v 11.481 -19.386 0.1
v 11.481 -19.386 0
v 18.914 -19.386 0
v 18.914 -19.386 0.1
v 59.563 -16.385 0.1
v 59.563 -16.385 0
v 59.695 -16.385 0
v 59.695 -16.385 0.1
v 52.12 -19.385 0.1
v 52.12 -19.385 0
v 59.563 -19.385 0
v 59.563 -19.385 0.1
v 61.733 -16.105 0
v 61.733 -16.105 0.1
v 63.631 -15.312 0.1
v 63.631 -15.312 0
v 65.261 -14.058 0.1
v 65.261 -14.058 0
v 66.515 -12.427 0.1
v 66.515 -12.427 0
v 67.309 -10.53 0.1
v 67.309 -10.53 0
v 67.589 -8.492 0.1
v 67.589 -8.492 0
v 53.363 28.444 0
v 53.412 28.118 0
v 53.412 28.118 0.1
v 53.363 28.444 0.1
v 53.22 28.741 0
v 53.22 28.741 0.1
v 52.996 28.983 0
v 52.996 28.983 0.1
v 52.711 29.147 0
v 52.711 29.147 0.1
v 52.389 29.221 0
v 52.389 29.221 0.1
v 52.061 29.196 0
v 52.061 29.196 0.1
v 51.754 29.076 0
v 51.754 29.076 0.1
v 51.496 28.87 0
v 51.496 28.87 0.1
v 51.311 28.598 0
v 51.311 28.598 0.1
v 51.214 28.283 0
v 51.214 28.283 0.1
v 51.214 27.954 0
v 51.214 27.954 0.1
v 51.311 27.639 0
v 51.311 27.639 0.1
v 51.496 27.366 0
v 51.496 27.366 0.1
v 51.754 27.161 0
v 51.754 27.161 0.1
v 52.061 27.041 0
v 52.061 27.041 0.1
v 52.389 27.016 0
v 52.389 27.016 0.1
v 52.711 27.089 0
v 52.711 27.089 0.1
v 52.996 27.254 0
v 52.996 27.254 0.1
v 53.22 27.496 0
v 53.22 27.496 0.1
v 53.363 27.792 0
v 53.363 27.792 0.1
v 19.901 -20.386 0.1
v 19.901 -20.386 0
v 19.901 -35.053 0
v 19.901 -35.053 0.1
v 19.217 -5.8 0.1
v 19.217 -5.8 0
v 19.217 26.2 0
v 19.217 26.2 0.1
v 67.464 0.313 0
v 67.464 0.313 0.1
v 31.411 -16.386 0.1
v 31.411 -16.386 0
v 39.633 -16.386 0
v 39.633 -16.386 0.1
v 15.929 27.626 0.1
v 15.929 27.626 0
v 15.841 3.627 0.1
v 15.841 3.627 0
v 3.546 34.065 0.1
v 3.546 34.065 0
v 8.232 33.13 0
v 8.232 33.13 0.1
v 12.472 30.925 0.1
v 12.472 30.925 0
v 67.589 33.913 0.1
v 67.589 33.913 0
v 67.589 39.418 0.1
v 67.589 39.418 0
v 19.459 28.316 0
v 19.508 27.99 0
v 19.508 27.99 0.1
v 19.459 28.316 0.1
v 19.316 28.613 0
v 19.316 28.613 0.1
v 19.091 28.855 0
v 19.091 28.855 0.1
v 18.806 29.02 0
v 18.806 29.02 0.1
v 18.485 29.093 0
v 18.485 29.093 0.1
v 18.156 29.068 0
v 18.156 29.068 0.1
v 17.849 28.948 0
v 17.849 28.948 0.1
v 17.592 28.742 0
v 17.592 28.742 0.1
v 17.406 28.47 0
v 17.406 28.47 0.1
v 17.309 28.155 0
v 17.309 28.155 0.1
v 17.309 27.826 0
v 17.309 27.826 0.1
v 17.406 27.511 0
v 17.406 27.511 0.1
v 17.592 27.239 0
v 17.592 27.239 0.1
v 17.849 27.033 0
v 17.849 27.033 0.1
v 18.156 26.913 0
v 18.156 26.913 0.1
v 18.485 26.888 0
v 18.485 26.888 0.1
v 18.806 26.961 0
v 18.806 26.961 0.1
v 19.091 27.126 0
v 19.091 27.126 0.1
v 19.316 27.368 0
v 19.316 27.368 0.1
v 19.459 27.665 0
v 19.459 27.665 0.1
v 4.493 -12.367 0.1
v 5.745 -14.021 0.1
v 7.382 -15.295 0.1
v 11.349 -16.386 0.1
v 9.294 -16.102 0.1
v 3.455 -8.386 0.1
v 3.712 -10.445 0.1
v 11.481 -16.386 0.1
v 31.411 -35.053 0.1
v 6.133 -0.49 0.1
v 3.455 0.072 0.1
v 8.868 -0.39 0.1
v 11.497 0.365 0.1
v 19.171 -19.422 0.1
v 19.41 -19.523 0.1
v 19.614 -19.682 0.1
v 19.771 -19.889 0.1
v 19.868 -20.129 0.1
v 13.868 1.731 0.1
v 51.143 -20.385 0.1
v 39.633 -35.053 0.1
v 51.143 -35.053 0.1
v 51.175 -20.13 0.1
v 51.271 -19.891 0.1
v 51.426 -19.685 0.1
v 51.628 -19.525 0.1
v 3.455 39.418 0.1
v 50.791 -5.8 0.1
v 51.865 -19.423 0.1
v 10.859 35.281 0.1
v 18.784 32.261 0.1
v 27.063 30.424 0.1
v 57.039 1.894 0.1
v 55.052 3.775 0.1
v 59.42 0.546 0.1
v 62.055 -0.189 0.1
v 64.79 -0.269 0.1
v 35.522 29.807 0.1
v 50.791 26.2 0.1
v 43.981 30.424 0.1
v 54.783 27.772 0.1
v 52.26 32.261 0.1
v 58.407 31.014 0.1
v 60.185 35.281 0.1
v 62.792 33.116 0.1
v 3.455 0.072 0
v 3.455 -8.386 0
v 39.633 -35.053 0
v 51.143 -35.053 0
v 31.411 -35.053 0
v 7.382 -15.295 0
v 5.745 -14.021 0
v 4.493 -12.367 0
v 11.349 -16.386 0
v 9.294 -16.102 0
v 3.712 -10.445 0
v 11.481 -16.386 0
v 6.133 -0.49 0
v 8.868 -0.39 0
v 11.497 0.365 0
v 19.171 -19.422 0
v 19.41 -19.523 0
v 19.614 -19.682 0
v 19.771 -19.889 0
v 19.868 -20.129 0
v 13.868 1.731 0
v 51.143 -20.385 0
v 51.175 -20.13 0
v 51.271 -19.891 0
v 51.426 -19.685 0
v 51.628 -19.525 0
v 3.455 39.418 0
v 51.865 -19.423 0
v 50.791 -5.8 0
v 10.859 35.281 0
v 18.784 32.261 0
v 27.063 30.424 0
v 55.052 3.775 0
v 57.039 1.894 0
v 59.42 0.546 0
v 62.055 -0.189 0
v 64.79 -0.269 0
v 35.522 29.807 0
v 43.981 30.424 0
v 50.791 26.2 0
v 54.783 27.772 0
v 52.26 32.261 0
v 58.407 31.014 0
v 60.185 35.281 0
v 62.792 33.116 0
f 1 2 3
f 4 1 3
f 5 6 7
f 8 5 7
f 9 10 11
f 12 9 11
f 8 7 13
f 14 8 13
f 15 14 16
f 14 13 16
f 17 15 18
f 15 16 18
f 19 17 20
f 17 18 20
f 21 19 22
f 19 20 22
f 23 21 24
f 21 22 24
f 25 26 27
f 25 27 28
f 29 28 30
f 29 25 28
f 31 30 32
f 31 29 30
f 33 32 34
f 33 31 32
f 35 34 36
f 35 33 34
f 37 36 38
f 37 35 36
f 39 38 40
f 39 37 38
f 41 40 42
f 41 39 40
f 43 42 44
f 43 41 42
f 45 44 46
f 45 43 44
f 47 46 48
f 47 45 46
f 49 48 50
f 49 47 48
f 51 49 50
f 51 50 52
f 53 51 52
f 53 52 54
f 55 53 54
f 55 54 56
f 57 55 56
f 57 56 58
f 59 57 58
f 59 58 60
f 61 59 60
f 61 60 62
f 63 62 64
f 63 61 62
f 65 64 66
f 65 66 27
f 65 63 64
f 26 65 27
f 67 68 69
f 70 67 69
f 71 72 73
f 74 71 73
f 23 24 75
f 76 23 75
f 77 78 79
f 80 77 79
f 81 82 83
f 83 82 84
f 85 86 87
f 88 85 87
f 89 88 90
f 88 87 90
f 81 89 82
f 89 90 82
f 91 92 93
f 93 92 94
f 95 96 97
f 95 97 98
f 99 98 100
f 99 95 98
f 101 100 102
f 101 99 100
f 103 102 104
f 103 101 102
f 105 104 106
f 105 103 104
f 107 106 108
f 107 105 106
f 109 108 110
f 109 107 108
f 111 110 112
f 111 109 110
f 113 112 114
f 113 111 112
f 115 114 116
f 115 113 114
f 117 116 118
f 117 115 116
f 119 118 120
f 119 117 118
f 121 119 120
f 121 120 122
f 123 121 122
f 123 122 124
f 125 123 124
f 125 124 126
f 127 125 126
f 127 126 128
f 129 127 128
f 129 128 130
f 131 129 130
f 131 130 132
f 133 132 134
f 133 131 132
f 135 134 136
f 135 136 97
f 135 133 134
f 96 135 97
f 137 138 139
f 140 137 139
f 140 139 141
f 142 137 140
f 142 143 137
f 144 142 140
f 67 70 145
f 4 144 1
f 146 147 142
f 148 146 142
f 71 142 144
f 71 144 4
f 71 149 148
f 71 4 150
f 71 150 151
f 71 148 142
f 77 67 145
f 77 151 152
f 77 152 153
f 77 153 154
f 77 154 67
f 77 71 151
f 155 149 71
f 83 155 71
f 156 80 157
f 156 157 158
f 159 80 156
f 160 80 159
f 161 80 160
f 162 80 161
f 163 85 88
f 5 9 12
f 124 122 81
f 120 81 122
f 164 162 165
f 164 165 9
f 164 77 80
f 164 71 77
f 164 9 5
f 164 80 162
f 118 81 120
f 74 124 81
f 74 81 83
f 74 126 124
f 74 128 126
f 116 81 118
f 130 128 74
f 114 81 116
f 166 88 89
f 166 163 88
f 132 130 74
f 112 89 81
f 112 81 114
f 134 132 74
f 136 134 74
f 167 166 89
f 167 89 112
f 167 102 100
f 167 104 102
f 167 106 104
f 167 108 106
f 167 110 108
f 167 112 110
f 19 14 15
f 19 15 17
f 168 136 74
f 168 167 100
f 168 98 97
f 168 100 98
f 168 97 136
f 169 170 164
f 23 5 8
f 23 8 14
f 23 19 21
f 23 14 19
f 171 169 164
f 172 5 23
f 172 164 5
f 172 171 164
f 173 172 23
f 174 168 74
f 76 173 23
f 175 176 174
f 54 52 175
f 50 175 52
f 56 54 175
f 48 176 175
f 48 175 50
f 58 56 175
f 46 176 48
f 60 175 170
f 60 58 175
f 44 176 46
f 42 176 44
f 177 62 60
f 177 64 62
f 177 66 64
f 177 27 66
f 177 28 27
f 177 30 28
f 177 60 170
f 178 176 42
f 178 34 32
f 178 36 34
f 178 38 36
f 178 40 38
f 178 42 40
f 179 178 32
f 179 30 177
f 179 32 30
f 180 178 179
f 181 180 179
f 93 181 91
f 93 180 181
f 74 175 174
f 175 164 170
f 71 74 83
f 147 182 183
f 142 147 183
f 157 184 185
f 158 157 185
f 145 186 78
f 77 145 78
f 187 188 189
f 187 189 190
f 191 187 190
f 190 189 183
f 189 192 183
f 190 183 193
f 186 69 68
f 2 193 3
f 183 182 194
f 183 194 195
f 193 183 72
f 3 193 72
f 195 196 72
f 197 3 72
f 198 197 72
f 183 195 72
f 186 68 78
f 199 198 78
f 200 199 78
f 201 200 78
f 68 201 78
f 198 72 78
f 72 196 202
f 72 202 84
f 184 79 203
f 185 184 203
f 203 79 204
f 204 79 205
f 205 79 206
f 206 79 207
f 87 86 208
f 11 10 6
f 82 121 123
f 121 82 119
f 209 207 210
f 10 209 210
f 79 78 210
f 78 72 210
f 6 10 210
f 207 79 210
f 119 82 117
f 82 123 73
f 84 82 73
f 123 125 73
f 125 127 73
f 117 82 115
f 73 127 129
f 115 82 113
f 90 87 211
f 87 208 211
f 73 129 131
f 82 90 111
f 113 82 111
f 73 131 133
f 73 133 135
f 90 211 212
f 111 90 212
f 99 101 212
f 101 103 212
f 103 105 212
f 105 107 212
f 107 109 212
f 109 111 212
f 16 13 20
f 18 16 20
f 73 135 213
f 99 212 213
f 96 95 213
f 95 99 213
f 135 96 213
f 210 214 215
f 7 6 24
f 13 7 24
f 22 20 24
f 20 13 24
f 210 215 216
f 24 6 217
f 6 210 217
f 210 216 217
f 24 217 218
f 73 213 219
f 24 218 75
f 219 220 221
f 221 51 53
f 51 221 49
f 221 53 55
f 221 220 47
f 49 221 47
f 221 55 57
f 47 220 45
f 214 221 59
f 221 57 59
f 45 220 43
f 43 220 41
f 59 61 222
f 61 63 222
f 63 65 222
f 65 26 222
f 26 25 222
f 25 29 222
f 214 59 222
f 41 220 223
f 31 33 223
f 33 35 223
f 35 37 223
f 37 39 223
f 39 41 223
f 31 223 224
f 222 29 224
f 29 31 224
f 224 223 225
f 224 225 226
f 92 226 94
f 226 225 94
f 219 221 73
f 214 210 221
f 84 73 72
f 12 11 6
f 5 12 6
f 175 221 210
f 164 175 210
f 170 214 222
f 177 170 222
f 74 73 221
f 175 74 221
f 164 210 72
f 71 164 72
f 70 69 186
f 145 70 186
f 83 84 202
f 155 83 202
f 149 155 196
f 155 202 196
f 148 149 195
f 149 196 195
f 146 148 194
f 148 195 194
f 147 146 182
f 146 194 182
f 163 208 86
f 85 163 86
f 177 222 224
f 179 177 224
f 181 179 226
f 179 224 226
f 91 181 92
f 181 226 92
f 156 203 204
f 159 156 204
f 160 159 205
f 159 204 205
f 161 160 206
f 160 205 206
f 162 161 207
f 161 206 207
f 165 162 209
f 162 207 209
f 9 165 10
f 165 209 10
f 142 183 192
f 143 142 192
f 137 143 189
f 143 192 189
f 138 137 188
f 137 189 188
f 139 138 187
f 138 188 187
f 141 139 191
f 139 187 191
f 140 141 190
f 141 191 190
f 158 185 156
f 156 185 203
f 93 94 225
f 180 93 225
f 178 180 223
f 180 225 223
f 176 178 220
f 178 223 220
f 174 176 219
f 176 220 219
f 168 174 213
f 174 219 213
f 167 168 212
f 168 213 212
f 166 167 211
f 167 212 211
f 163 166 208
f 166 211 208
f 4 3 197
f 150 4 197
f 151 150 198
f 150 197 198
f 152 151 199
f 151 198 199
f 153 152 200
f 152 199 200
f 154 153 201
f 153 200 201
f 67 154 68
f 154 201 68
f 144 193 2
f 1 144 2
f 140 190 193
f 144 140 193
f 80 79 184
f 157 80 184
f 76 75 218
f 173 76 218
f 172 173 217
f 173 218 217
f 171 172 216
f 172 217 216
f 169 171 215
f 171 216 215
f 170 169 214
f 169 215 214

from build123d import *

# Parameters (mm, degrees)
MODEL_R                 = 1.105480949
SALIENTE_EXTRUIR1_DEPTH = 0.1


with BuildPart() as part:
    # Model → Saliente-Extruir1 (new body)
    with BuildSketch(Plane.XY):
        with BuildLine():
            Line((51.143384, -35.053134749), (51.143384, -20.385289094))
            ThreePointArc((51.143384, -20.385289094), (51.426053418, -19.68453986), (52.1199065, -19.385341948))
            Line((52.1199065, -19.385341948), (59.562610667, -19.385341948))
            Line((59.562610667, -19.385341948), (59.562610667, -17.385341948))
            Line((59.562610667, -17.385341948), (59.562610667, -16.385341948))
            Line((59.562610667, -16.385341948), (59.695317333, -16.385341948))
            ThreePointArc((59.695317333, -16.385341948), (65.261252438, -14.057943719), (67.588650667, -8.492008614))
            Line((67.588650667, -8.492008614), (67.463691144, 0.313086794))
            ThreePointArc((67.463691144, 0.313086794), (60.715005996, 0.09791285), (55.052059002, 3.775151269))
            Line((55.052059002, 3.775151269), (54.782677463, 27.772447041))
            ThreePointArc((54.782677463, 27.772447041), (60.525183262, 32.220247397), (67.588650667, 33.913389175))
            Line((67.588650667, 33.913389175), (67.588650667, 39.418409961))
            ThreePointArc((67.588650667, 39.418409961), (35.521984, 29.806750722), (3.455317333, 39.418409961))
            Line((3.455317333, 39.418409961), (3.545697938, 34.065337225))
            ThreePointArc((3.545697938, 34.065337225), (10.429922022, 32.177547893), (15.929001679, 27.626019279))
            Line((15.929001679, 27.626019279), (15.840502335, 3.627374762))
            ThreePointArc((15.840502335, 3.627374762), (10.205432608, -0.092442467), (3.455317333, 0.071858577))
            Line((3.455317333, 0.071858577), (3.455317333, -8.386134749))
            ThreePointArc((3.455317333, -8.386134749), (5.745129751, -14.020897609), (11.348650667, -16.386134749))
            Line((11.348650667, -16.386134749), (11.481357333, -16.386134749))
            Line((11.481357333, -16.386134749), (11.481357333, -19.386134749))
            Line((11.481357333, -19.386134749), (18.913917333, -19.386134749))
            ThreePointArc((18.913917333, -19.386134749), (19.614357448, -19.681789392), (19.900584, -20.386134749))
            Line((19.900584, -20.386134749), (19.900584, -35.053134749))
            Line((19.900584, -35.053134749), (31.411037333, -35.053134749))
            Line((31.411037333, -35.053134749), (31.411037333, -16.386134749))
            Line((31.411037333, -16.386134749), (39.632930667, -16.386134749))
            Line((39.632930667, -16.386134749), (39.632930667, -35.053134749))
            Line((39.632930667, -35.053134749), (51.143384, -35.053134749))
        make_face()
        Polygon((35.504038921, 26.200203798), (50.790705587, 26.200203798), (50.790705587, -5.799796202), (19.217372254, -5.799796202), (19.217372254, 26.200203798), align=None, mode=Mode.SUBTRACT)
        with Locations((18.402228125, 27.990495682)):
            Circle(MODEL_R, mode=Mode.SUBTRACT)
        with Locations((52.306774108, 28.11827167)):
            Circle(MODEL_R, mode=Mode.SUBTRACT)
    extrude(amount=SALIENTE_EXTRUIR1_DEPTH)


solid = part.part
